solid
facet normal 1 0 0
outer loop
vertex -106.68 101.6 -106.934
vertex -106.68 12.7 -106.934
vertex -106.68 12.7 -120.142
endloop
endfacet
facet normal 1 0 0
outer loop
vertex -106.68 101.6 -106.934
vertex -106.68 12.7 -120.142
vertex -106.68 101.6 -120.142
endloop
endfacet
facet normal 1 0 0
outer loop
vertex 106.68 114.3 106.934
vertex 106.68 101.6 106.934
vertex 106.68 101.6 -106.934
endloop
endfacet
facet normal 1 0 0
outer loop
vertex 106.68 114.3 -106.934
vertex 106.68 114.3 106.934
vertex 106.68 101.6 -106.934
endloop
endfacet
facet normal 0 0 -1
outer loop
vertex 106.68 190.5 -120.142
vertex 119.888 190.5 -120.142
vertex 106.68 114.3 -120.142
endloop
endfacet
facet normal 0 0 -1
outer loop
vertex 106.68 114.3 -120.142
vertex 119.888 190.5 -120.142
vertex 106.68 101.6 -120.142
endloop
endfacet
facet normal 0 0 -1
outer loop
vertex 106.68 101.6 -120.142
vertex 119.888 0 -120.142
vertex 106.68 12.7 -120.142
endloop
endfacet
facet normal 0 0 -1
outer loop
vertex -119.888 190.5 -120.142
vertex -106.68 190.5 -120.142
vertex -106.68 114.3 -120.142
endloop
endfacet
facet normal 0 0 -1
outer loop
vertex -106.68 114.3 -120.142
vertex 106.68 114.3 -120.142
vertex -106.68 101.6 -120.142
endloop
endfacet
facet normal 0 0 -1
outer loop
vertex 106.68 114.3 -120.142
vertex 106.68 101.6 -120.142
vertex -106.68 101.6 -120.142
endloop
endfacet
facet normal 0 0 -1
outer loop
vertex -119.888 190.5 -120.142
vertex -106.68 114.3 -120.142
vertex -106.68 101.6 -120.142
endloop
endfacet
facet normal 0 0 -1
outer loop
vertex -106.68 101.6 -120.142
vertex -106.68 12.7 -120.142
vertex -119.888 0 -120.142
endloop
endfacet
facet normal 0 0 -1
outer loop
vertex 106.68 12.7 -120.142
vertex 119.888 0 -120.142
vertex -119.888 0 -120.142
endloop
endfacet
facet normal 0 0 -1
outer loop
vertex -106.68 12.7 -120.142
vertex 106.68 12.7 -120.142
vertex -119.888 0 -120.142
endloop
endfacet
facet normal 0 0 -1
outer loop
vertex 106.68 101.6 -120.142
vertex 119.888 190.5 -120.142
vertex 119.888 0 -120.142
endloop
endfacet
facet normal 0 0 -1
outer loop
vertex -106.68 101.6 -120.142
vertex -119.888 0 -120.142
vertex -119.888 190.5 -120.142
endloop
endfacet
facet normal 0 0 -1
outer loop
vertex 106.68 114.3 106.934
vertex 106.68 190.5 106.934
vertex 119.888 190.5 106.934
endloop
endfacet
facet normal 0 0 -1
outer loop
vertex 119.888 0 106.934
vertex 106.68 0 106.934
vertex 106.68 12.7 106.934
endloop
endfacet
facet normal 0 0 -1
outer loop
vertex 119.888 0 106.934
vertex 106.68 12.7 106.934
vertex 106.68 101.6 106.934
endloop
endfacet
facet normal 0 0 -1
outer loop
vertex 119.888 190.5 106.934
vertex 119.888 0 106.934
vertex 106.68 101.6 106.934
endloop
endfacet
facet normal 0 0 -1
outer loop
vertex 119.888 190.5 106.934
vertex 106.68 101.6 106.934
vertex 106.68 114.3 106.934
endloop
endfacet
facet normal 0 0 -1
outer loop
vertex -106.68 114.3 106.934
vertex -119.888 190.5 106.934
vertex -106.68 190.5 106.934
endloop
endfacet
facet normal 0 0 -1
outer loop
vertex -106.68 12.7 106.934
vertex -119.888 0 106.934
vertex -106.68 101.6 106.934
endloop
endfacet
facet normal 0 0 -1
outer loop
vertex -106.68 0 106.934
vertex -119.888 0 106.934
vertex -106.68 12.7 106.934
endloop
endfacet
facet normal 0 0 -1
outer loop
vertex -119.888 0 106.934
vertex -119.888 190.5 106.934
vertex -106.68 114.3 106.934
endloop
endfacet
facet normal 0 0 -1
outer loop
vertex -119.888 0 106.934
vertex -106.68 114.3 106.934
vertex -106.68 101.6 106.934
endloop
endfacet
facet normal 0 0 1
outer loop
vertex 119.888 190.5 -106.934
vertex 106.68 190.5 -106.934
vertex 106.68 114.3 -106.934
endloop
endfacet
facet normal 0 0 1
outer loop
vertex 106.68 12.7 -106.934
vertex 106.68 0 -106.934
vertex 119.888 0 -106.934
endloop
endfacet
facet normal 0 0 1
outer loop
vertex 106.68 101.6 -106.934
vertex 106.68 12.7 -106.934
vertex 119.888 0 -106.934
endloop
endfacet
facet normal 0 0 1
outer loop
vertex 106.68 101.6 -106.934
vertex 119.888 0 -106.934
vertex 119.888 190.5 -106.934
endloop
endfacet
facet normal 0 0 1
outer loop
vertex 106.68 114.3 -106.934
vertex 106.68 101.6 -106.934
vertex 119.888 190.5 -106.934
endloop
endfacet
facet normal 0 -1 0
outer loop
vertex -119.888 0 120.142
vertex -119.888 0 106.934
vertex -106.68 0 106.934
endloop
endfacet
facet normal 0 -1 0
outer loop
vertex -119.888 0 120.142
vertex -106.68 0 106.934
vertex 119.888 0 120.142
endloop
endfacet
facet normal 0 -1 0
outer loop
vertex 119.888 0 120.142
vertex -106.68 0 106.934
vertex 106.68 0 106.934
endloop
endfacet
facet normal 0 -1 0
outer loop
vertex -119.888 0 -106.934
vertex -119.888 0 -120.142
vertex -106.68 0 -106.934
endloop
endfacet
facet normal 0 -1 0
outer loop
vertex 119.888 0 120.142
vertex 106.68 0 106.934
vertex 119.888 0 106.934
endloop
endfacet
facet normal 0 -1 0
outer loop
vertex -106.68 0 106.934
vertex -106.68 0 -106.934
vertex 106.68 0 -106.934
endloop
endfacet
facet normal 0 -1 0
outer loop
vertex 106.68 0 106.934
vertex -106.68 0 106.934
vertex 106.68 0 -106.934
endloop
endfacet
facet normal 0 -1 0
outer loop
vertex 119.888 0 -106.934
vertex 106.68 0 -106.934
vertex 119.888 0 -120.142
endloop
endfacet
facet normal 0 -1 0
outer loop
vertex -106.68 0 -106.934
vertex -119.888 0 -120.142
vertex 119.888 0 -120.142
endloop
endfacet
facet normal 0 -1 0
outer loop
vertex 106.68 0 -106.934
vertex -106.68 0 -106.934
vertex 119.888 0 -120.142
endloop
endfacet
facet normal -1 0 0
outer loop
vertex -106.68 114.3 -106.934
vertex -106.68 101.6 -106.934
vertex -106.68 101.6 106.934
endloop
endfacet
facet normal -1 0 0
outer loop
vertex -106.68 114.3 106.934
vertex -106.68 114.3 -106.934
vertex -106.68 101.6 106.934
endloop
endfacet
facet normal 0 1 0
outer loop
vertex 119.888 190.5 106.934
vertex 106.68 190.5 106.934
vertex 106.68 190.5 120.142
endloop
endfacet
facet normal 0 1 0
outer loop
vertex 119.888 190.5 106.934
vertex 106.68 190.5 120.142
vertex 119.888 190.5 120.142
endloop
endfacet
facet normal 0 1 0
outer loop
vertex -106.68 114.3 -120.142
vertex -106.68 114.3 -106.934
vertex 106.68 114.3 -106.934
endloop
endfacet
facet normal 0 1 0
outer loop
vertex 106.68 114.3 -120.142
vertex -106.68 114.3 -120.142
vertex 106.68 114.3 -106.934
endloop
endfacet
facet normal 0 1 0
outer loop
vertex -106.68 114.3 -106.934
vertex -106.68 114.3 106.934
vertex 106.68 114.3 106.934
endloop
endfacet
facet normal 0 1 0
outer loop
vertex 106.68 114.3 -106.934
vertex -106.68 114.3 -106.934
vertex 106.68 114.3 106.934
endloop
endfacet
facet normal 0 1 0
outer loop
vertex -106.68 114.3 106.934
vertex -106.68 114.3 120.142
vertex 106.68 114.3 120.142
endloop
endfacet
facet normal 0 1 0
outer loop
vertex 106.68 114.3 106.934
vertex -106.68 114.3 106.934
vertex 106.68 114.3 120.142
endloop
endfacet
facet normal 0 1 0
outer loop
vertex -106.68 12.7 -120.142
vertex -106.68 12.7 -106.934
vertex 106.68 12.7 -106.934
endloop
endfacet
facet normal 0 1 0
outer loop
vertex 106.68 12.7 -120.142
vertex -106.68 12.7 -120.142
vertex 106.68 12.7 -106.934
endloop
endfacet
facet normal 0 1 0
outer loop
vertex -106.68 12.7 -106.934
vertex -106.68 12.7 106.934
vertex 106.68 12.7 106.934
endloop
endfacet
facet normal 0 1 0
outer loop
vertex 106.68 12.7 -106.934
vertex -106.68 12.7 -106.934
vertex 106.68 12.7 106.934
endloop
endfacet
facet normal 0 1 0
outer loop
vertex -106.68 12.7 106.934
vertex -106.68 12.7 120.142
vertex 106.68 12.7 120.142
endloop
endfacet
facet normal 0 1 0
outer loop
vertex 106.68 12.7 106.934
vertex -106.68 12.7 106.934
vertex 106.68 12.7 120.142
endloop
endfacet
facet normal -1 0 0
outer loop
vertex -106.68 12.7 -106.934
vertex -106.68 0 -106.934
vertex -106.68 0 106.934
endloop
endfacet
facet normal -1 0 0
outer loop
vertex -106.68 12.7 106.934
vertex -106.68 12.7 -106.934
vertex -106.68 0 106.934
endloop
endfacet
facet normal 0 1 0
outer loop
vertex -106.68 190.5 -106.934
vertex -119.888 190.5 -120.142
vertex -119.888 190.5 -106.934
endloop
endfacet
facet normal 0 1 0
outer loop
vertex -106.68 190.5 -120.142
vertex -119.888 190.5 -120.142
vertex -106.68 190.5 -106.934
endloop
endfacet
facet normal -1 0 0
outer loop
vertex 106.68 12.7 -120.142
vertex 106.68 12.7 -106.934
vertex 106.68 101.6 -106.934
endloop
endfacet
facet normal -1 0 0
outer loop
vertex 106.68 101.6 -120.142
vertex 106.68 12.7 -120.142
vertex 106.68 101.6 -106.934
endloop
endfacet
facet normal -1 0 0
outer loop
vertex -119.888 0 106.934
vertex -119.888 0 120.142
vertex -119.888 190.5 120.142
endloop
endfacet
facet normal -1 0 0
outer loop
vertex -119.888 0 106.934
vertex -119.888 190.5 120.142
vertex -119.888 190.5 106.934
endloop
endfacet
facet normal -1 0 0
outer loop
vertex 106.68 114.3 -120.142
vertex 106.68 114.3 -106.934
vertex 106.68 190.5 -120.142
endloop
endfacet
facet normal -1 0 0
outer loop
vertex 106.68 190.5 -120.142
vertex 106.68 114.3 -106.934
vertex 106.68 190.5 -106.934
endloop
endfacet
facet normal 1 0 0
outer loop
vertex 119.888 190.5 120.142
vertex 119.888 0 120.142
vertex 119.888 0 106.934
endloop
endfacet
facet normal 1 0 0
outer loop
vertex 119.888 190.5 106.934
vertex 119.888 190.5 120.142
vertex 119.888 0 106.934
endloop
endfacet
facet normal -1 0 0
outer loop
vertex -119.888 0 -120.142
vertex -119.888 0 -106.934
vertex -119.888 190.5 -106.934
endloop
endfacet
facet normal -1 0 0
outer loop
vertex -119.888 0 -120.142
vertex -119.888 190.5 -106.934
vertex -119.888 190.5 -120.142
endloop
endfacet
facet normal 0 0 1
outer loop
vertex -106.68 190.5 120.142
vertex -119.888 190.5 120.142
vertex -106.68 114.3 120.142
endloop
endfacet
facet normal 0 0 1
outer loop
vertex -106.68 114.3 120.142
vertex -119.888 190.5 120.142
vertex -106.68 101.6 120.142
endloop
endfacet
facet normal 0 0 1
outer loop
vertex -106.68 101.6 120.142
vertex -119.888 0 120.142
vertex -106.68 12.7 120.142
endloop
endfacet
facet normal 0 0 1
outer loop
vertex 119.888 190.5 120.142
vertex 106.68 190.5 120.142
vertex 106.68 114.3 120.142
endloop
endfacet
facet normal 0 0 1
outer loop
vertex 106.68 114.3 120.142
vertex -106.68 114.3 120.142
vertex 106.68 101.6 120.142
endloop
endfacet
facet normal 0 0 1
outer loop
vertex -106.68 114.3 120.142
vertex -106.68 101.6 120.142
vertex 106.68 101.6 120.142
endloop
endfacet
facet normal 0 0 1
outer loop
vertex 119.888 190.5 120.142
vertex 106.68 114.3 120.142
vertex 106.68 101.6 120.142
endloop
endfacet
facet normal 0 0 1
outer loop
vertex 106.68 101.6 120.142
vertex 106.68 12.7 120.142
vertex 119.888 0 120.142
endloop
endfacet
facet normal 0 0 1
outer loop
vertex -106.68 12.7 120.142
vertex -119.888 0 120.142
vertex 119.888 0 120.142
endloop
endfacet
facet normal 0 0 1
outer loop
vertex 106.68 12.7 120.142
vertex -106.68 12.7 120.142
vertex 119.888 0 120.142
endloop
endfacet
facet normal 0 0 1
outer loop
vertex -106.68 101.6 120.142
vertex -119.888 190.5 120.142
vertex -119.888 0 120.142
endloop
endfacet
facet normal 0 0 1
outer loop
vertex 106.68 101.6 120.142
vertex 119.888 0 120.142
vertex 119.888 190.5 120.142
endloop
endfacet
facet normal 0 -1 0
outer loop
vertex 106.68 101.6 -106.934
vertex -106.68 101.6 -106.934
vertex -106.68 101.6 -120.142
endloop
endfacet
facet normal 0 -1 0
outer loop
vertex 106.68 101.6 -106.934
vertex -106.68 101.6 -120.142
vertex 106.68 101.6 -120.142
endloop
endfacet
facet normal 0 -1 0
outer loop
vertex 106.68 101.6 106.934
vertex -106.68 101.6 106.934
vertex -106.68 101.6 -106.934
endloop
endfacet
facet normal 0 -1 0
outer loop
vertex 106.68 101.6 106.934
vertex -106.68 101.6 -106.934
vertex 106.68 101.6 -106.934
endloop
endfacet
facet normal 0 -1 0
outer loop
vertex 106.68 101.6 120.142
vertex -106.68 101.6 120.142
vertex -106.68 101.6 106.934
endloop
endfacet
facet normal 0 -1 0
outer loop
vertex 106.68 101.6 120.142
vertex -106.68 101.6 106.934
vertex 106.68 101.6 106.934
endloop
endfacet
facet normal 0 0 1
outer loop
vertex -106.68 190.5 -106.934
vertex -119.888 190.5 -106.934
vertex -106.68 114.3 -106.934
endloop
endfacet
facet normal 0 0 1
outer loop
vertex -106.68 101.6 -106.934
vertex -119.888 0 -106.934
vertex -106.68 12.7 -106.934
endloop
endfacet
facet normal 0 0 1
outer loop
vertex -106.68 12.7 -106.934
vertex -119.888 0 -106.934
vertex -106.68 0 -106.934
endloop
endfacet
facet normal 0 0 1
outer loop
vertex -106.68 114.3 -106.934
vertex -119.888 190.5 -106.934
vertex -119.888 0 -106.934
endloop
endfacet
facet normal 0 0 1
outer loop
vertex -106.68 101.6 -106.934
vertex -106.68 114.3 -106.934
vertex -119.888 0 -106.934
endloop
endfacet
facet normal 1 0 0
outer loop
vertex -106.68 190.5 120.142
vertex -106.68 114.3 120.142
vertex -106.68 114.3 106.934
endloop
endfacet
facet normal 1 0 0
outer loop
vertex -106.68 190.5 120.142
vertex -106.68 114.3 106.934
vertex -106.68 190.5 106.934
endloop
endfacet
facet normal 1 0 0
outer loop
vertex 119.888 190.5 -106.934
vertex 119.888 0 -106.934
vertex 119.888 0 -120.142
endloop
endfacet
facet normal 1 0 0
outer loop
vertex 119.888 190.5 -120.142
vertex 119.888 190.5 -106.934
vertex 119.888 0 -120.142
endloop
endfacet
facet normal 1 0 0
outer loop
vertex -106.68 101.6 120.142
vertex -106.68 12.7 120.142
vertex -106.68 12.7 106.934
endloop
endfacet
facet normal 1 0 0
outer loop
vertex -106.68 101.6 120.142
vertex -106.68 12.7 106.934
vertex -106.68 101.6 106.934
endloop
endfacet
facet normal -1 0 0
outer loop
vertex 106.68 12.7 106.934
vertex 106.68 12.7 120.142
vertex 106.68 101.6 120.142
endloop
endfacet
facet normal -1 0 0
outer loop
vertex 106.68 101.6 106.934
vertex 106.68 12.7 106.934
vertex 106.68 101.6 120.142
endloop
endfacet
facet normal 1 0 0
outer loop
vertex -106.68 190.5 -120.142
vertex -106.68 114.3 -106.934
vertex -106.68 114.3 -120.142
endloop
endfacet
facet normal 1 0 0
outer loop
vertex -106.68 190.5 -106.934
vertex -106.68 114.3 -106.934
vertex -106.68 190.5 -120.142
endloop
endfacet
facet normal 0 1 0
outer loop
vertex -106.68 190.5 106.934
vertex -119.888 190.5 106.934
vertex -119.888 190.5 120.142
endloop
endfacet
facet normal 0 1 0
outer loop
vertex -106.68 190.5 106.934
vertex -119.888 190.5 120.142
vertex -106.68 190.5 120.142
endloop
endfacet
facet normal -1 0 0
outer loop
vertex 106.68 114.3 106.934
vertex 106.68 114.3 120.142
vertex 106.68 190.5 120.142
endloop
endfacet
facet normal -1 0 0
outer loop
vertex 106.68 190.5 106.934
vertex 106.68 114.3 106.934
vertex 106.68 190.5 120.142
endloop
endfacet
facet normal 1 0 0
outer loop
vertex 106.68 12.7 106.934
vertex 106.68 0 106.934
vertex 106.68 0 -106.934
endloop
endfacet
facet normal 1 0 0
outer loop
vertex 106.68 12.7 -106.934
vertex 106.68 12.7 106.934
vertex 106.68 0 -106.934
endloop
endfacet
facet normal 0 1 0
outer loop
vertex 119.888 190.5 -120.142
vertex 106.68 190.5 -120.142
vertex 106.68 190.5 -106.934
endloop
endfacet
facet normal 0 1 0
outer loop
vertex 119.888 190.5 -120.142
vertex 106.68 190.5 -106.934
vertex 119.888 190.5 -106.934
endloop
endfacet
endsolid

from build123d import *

# Parameters (mm, degrees)
SKETCH1_W           = 13.208
SKETCH1_H           = 13.208
BOSS_EXTRUDE1_DEPTH = 190.5
SKETCH3_W           = 213.36
SKETCH3_H           = 88.9
SKETCH3_H_2         = 76.2
CUT_EXTRUDE2_DEPTH  = 304.8


with BuildPart() as part:
    # Sketch1 → Boss-Extrude1 (new body)
    with BuildSketch(Plane(origin=(0, 0, 0), x_dir=(1, 0, 0), z_dir=(0, 1, 0))):
        Polygon((106.68, 120.142), (0, 120.142), (0, 0), (106.68, 0), (106.68, 106.934), align=None)
        with Locations((113.284, 113.538)):
            Rectangle(SKETCH1_W, SKETCH1_H)
        Polygon((106.68, 0), (0, 0), (0, -120.142), (106.68, -120.142), (106.68, -106.934), align=None)
        Polygon((0, -120.142), (0, 0), (-106.68, 0), (-106.68, -106.934), (-106.68, -120.142), align=None)
        with Locations((-113.284, -113.538)):
            Rectangle(SKETCH1_W, SKETCH1_H)
        Polygon((0, 0), (0, 120.142), (-106.68, 120.142), (-106.68, 106.934), (-106.68, 0), align=None)
        with Locations((-113.284, 113.538)):
            Rectangle(SKETCH1_W, SKETCH1_H)
        with Locations((113.284, -113.538)):
            Rectangle(SKETCH1_W, SKETCH1_H)
    extrude(amount=BOSS_EXTRUDE1_DEPTH)

    # Sketch3 → Cut-Extrude2 (cut)
    with BuildSketch(Plane.XY.offset(120.142)):
        with Locations((0, 57.15)):
            Rectangle(SKETCH3_W, SKETCH3_H)
        with Locations((0, 152.4)):
            Rectangle(SKETCH3_W, SKETCH3_H_2)
    extrude(amount=-CUT_EXTRUDE2_DEPTH, mode=Mode.SUBTRACT)


solid = part.part
